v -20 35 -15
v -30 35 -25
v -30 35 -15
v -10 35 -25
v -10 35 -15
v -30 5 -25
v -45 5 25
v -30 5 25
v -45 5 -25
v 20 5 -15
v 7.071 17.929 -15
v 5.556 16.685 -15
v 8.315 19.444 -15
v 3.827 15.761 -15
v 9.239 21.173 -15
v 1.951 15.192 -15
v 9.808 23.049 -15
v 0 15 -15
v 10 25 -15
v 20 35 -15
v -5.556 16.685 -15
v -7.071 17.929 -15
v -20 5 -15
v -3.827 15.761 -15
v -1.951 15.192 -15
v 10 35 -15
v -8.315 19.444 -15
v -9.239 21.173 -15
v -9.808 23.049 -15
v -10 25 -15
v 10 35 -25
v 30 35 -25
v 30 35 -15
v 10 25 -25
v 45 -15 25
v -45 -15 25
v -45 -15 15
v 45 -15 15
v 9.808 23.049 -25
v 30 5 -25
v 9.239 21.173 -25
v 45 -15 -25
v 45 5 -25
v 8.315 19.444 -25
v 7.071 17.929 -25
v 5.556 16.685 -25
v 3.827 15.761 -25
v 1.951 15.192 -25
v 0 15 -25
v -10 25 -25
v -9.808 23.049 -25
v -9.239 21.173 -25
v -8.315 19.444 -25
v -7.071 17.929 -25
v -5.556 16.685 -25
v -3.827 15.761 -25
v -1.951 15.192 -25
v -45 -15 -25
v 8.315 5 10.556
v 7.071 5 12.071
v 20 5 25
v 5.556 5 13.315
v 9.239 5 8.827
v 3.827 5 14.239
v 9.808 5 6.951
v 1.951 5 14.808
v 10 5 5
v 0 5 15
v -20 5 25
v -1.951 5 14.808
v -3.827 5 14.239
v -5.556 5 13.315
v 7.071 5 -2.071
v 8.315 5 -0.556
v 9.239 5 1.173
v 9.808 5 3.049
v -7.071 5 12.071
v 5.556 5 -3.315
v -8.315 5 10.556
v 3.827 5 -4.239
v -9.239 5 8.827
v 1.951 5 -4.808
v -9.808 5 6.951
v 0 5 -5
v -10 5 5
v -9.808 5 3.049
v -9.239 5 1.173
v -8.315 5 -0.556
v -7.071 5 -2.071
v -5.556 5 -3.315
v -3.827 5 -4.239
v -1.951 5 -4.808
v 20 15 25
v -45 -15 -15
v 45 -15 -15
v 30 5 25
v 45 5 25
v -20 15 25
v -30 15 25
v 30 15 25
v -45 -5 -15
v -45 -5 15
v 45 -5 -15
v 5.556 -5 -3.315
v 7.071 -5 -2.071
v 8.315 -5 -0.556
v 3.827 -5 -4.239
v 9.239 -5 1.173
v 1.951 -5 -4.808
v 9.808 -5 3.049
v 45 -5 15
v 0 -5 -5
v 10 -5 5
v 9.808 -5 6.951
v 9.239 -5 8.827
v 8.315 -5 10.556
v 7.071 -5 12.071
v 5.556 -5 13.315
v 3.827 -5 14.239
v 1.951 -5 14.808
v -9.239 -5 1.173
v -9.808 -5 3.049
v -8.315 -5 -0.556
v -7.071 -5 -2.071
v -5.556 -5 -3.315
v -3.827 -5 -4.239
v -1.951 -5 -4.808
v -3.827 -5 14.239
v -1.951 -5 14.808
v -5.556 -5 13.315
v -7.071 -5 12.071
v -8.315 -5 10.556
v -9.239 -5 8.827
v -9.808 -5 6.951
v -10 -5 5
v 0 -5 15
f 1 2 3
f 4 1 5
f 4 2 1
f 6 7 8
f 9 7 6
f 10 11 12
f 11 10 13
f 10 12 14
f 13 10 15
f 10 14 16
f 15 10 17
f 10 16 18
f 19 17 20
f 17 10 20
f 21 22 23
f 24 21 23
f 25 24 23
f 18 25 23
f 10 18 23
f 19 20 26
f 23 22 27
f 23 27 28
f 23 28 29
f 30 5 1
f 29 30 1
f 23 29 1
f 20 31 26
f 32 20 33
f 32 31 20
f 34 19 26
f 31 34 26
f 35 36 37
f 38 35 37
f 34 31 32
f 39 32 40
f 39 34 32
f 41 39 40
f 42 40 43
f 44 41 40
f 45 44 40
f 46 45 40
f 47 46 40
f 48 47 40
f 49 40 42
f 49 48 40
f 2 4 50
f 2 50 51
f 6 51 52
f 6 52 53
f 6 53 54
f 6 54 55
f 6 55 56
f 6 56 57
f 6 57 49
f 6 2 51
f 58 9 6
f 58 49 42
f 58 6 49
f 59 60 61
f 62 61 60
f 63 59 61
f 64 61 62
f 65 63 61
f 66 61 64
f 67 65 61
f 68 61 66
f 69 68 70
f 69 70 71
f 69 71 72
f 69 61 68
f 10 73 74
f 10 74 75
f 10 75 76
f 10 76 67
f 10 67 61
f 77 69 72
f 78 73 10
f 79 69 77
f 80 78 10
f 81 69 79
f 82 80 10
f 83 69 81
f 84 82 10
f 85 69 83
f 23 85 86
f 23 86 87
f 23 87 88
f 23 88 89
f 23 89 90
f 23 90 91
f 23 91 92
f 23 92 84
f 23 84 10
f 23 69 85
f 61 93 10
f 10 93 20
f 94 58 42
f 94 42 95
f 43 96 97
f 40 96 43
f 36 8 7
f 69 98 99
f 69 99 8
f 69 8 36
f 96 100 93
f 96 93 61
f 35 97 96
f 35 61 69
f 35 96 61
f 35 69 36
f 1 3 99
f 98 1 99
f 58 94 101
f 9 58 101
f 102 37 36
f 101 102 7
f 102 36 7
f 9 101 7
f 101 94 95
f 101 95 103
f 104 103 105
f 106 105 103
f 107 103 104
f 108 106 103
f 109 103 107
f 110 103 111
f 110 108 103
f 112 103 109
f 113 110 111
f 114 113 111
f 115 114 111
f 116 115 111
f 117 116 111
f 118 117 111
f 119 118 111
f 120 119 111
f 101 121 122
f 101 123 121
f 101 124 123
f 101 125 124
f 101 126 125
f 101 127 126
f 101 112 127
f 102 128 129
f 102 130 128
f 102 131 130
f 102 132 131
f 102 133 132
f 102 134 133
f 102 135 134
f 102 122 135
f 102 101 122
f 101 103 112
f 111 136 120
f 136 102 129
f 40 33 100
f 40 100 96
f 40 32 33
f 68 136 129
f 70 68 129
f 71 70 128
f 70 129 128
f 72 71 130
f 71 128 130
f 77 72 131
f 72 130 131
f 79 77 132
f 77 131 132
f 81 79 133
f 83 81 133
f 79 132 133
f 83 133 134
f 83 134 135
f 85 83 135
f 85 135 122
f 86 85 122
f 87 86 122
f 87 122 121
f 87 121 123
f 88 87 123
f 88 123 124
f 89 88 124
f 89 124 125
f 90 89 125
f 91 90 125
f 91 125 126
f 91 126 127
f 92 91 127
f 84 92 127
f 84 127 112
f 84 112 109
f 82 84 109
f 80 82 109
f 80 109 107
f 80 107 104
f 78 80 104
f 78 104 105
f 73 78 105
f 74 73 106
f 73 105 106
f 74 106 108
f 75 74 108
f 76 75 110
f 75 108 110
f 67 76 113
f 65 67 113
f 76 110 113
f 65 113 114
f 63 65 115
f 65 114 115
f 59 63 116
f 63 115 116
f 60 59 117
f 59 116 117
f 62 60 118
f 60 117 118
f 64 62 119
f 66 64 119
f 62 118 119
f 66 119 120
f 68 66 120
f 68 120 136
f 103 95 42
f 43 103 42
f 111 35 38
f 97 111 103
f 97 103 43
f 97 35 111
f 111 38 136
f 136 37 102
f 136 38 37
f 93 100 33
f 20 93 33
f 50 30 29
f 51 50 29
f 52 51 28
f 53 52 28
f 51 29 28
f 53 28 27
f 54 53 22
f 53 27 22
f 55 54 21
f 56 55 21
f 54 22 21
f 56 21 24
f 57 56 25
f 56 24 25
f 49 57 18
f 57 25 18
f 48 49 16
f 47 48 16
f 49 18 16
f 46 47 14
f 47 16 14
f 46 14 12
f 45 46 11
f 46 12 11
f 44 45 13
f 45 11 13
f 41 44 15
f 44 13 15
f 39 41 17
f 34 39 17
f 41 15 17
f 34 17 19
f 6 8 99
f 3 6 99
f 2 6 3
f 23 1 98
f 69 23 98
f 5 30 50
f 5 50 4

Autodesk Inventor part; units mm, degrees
ref_plane "YZ Plane" through (0, 0, 0) normal (1, 0, 0) x (0, 1, 0)
ref_plane "XZ Plane" through (0, 0, 0) normal (0, 1, 0) x (-1, 0, 0)
ref_plane "XY Plane" through (0, 0, 0) normal (0, 0, 1) x (1, 0, 0)
sketch "Sketch1" plane through (0, 0, 0) normal (1, 0, 0) x (0, 1, 0)
  line L0 (-5, 25) -> (5, 25)
  line L1 (5, 25) -> (5, -25)
  line L2 (5, -25) -> (-5, -25)
  line L3 (-5, -25) -> (-5, 25)
  line L4 (-5, 25) -> (5, -25) construction
  line L5 (5, 25) -> (-5, -25) construction
  line L6 (-5, -25) -> (-15, -25)
  line L7 (-15, -25) -> (-15, -15)
  line L8 (-15, -15) -> (-5, -15)
  line L9 (-5, -15) -> (-5, -25)
  line L10 (5, 0) -> (-34.0233, 0) construction
  line L11 (-5, 25) -> (-15, 25)
  line L12 (-15, 25) -> (-15, 15)
  line L13 (-15, 15) -> (-5, 15)
  point P0 (0, 0)
  point P1 (-15, -20)
  dimension "d0" = 50
  dimension "d1" = 10
  dimension "d2" = 10
  dimension "d3" = 20
extrude "Extrusion1" add sketch "Sketch1" along normal mid plane 90
sketch "Sketch2" plane through (45, 5, -25) normal (0, 0, -1) x (-1, 0, 0)
  line L0 (0, 0) -> (90, 0) projected
  line L1 (0, -20) -> (0, 0) projected
  line L2 (90, -20) -> (0, -20) projected
  line L3 (90, 0) -> (90, -20) projected
  line L4 (15, 0) -> (75, 0)
  line L5 (75, 0) -> (75, 30)
  line L6 (75, 30) -> (15, 30)
  line L7 (15, 30) -> (15, 0)
  point P0 (45, -5)
  point P1 (45, 30)
  dimension "d6" = 50
  dimension "d7" = 60
extrude "Extrusion2" add sketch "Sketch2" against normal blind 10 contours L7 L6 L5 L0
sketch "Sketch3" plane through (-30, 5, -25) normal (-1, 0, 0) x (0, 0, 1)
  line L0 (0, 30) -> (10, 30) projected
  line L1 (0, 0) -> (50, 0) projected
  line L2 (10, 30) -> (50, 10)
  line L3 (50, 0) -> (50, -20) projected
  line L4 (50, 0) -> (50, 10)
  line L5 (40, -20) -> (50, -20) projected
  line L6 (0, 0) -> (0, 30) projected
  point P0 (25, -5)
  dimension "d28" = 30
extrude "Extrusion4" add sketch "Sketch3" against normal blind 10
mirror "Mirror1" about plane through (0, 0, 0) normal (1, 0, 0) of "Extrusion4"
sketch "Sketch4" plane through (45, 5, -15) normal (0, 0, 1) x (1, 0, 0)
  circle A0 centre (-45, 20) radius 10
  line L0 (-55, 20) -> (-55, 30)
  line L1 (-15, 30) -> (-75, 30) projected
  line L2 (-45, 30) -> (-45, 0) construction
  line L3 (-15, 0) -> (-75, 0) projected
  line L4 (-35, 20) -> (-35, 30)
  point P0 (-45, -5)
  point P1 (-25, 30)
  point P2 (-65, 30)
  point P3 (-25, 0)
  point P4 (-65, 0)
  point P5 (-45, 10)
  point P6 (-35, 20)
  dimension "d16" = 20
  dimension "d17" = 20
extrude "Extrusion3" cut sketch "Sketch4" against normal through all
sketch "Sketch5" plane through (-20, 5, 25) normal (0, 1, 0) x (1, 0, 0)
  line L0 (40, 40) -> (30, 40) projected
  line L1 (0, 0) -> (40, 0) projected
  point P0 (20, 20)
  point P1 (50, 40)
  point P2 (20, 0)
  dimension "d20" = 20
hole "Hole1" at (0, 5, 5) direction (0, -1, 0) diameter 20 end through all
properties part number "s14-12"
